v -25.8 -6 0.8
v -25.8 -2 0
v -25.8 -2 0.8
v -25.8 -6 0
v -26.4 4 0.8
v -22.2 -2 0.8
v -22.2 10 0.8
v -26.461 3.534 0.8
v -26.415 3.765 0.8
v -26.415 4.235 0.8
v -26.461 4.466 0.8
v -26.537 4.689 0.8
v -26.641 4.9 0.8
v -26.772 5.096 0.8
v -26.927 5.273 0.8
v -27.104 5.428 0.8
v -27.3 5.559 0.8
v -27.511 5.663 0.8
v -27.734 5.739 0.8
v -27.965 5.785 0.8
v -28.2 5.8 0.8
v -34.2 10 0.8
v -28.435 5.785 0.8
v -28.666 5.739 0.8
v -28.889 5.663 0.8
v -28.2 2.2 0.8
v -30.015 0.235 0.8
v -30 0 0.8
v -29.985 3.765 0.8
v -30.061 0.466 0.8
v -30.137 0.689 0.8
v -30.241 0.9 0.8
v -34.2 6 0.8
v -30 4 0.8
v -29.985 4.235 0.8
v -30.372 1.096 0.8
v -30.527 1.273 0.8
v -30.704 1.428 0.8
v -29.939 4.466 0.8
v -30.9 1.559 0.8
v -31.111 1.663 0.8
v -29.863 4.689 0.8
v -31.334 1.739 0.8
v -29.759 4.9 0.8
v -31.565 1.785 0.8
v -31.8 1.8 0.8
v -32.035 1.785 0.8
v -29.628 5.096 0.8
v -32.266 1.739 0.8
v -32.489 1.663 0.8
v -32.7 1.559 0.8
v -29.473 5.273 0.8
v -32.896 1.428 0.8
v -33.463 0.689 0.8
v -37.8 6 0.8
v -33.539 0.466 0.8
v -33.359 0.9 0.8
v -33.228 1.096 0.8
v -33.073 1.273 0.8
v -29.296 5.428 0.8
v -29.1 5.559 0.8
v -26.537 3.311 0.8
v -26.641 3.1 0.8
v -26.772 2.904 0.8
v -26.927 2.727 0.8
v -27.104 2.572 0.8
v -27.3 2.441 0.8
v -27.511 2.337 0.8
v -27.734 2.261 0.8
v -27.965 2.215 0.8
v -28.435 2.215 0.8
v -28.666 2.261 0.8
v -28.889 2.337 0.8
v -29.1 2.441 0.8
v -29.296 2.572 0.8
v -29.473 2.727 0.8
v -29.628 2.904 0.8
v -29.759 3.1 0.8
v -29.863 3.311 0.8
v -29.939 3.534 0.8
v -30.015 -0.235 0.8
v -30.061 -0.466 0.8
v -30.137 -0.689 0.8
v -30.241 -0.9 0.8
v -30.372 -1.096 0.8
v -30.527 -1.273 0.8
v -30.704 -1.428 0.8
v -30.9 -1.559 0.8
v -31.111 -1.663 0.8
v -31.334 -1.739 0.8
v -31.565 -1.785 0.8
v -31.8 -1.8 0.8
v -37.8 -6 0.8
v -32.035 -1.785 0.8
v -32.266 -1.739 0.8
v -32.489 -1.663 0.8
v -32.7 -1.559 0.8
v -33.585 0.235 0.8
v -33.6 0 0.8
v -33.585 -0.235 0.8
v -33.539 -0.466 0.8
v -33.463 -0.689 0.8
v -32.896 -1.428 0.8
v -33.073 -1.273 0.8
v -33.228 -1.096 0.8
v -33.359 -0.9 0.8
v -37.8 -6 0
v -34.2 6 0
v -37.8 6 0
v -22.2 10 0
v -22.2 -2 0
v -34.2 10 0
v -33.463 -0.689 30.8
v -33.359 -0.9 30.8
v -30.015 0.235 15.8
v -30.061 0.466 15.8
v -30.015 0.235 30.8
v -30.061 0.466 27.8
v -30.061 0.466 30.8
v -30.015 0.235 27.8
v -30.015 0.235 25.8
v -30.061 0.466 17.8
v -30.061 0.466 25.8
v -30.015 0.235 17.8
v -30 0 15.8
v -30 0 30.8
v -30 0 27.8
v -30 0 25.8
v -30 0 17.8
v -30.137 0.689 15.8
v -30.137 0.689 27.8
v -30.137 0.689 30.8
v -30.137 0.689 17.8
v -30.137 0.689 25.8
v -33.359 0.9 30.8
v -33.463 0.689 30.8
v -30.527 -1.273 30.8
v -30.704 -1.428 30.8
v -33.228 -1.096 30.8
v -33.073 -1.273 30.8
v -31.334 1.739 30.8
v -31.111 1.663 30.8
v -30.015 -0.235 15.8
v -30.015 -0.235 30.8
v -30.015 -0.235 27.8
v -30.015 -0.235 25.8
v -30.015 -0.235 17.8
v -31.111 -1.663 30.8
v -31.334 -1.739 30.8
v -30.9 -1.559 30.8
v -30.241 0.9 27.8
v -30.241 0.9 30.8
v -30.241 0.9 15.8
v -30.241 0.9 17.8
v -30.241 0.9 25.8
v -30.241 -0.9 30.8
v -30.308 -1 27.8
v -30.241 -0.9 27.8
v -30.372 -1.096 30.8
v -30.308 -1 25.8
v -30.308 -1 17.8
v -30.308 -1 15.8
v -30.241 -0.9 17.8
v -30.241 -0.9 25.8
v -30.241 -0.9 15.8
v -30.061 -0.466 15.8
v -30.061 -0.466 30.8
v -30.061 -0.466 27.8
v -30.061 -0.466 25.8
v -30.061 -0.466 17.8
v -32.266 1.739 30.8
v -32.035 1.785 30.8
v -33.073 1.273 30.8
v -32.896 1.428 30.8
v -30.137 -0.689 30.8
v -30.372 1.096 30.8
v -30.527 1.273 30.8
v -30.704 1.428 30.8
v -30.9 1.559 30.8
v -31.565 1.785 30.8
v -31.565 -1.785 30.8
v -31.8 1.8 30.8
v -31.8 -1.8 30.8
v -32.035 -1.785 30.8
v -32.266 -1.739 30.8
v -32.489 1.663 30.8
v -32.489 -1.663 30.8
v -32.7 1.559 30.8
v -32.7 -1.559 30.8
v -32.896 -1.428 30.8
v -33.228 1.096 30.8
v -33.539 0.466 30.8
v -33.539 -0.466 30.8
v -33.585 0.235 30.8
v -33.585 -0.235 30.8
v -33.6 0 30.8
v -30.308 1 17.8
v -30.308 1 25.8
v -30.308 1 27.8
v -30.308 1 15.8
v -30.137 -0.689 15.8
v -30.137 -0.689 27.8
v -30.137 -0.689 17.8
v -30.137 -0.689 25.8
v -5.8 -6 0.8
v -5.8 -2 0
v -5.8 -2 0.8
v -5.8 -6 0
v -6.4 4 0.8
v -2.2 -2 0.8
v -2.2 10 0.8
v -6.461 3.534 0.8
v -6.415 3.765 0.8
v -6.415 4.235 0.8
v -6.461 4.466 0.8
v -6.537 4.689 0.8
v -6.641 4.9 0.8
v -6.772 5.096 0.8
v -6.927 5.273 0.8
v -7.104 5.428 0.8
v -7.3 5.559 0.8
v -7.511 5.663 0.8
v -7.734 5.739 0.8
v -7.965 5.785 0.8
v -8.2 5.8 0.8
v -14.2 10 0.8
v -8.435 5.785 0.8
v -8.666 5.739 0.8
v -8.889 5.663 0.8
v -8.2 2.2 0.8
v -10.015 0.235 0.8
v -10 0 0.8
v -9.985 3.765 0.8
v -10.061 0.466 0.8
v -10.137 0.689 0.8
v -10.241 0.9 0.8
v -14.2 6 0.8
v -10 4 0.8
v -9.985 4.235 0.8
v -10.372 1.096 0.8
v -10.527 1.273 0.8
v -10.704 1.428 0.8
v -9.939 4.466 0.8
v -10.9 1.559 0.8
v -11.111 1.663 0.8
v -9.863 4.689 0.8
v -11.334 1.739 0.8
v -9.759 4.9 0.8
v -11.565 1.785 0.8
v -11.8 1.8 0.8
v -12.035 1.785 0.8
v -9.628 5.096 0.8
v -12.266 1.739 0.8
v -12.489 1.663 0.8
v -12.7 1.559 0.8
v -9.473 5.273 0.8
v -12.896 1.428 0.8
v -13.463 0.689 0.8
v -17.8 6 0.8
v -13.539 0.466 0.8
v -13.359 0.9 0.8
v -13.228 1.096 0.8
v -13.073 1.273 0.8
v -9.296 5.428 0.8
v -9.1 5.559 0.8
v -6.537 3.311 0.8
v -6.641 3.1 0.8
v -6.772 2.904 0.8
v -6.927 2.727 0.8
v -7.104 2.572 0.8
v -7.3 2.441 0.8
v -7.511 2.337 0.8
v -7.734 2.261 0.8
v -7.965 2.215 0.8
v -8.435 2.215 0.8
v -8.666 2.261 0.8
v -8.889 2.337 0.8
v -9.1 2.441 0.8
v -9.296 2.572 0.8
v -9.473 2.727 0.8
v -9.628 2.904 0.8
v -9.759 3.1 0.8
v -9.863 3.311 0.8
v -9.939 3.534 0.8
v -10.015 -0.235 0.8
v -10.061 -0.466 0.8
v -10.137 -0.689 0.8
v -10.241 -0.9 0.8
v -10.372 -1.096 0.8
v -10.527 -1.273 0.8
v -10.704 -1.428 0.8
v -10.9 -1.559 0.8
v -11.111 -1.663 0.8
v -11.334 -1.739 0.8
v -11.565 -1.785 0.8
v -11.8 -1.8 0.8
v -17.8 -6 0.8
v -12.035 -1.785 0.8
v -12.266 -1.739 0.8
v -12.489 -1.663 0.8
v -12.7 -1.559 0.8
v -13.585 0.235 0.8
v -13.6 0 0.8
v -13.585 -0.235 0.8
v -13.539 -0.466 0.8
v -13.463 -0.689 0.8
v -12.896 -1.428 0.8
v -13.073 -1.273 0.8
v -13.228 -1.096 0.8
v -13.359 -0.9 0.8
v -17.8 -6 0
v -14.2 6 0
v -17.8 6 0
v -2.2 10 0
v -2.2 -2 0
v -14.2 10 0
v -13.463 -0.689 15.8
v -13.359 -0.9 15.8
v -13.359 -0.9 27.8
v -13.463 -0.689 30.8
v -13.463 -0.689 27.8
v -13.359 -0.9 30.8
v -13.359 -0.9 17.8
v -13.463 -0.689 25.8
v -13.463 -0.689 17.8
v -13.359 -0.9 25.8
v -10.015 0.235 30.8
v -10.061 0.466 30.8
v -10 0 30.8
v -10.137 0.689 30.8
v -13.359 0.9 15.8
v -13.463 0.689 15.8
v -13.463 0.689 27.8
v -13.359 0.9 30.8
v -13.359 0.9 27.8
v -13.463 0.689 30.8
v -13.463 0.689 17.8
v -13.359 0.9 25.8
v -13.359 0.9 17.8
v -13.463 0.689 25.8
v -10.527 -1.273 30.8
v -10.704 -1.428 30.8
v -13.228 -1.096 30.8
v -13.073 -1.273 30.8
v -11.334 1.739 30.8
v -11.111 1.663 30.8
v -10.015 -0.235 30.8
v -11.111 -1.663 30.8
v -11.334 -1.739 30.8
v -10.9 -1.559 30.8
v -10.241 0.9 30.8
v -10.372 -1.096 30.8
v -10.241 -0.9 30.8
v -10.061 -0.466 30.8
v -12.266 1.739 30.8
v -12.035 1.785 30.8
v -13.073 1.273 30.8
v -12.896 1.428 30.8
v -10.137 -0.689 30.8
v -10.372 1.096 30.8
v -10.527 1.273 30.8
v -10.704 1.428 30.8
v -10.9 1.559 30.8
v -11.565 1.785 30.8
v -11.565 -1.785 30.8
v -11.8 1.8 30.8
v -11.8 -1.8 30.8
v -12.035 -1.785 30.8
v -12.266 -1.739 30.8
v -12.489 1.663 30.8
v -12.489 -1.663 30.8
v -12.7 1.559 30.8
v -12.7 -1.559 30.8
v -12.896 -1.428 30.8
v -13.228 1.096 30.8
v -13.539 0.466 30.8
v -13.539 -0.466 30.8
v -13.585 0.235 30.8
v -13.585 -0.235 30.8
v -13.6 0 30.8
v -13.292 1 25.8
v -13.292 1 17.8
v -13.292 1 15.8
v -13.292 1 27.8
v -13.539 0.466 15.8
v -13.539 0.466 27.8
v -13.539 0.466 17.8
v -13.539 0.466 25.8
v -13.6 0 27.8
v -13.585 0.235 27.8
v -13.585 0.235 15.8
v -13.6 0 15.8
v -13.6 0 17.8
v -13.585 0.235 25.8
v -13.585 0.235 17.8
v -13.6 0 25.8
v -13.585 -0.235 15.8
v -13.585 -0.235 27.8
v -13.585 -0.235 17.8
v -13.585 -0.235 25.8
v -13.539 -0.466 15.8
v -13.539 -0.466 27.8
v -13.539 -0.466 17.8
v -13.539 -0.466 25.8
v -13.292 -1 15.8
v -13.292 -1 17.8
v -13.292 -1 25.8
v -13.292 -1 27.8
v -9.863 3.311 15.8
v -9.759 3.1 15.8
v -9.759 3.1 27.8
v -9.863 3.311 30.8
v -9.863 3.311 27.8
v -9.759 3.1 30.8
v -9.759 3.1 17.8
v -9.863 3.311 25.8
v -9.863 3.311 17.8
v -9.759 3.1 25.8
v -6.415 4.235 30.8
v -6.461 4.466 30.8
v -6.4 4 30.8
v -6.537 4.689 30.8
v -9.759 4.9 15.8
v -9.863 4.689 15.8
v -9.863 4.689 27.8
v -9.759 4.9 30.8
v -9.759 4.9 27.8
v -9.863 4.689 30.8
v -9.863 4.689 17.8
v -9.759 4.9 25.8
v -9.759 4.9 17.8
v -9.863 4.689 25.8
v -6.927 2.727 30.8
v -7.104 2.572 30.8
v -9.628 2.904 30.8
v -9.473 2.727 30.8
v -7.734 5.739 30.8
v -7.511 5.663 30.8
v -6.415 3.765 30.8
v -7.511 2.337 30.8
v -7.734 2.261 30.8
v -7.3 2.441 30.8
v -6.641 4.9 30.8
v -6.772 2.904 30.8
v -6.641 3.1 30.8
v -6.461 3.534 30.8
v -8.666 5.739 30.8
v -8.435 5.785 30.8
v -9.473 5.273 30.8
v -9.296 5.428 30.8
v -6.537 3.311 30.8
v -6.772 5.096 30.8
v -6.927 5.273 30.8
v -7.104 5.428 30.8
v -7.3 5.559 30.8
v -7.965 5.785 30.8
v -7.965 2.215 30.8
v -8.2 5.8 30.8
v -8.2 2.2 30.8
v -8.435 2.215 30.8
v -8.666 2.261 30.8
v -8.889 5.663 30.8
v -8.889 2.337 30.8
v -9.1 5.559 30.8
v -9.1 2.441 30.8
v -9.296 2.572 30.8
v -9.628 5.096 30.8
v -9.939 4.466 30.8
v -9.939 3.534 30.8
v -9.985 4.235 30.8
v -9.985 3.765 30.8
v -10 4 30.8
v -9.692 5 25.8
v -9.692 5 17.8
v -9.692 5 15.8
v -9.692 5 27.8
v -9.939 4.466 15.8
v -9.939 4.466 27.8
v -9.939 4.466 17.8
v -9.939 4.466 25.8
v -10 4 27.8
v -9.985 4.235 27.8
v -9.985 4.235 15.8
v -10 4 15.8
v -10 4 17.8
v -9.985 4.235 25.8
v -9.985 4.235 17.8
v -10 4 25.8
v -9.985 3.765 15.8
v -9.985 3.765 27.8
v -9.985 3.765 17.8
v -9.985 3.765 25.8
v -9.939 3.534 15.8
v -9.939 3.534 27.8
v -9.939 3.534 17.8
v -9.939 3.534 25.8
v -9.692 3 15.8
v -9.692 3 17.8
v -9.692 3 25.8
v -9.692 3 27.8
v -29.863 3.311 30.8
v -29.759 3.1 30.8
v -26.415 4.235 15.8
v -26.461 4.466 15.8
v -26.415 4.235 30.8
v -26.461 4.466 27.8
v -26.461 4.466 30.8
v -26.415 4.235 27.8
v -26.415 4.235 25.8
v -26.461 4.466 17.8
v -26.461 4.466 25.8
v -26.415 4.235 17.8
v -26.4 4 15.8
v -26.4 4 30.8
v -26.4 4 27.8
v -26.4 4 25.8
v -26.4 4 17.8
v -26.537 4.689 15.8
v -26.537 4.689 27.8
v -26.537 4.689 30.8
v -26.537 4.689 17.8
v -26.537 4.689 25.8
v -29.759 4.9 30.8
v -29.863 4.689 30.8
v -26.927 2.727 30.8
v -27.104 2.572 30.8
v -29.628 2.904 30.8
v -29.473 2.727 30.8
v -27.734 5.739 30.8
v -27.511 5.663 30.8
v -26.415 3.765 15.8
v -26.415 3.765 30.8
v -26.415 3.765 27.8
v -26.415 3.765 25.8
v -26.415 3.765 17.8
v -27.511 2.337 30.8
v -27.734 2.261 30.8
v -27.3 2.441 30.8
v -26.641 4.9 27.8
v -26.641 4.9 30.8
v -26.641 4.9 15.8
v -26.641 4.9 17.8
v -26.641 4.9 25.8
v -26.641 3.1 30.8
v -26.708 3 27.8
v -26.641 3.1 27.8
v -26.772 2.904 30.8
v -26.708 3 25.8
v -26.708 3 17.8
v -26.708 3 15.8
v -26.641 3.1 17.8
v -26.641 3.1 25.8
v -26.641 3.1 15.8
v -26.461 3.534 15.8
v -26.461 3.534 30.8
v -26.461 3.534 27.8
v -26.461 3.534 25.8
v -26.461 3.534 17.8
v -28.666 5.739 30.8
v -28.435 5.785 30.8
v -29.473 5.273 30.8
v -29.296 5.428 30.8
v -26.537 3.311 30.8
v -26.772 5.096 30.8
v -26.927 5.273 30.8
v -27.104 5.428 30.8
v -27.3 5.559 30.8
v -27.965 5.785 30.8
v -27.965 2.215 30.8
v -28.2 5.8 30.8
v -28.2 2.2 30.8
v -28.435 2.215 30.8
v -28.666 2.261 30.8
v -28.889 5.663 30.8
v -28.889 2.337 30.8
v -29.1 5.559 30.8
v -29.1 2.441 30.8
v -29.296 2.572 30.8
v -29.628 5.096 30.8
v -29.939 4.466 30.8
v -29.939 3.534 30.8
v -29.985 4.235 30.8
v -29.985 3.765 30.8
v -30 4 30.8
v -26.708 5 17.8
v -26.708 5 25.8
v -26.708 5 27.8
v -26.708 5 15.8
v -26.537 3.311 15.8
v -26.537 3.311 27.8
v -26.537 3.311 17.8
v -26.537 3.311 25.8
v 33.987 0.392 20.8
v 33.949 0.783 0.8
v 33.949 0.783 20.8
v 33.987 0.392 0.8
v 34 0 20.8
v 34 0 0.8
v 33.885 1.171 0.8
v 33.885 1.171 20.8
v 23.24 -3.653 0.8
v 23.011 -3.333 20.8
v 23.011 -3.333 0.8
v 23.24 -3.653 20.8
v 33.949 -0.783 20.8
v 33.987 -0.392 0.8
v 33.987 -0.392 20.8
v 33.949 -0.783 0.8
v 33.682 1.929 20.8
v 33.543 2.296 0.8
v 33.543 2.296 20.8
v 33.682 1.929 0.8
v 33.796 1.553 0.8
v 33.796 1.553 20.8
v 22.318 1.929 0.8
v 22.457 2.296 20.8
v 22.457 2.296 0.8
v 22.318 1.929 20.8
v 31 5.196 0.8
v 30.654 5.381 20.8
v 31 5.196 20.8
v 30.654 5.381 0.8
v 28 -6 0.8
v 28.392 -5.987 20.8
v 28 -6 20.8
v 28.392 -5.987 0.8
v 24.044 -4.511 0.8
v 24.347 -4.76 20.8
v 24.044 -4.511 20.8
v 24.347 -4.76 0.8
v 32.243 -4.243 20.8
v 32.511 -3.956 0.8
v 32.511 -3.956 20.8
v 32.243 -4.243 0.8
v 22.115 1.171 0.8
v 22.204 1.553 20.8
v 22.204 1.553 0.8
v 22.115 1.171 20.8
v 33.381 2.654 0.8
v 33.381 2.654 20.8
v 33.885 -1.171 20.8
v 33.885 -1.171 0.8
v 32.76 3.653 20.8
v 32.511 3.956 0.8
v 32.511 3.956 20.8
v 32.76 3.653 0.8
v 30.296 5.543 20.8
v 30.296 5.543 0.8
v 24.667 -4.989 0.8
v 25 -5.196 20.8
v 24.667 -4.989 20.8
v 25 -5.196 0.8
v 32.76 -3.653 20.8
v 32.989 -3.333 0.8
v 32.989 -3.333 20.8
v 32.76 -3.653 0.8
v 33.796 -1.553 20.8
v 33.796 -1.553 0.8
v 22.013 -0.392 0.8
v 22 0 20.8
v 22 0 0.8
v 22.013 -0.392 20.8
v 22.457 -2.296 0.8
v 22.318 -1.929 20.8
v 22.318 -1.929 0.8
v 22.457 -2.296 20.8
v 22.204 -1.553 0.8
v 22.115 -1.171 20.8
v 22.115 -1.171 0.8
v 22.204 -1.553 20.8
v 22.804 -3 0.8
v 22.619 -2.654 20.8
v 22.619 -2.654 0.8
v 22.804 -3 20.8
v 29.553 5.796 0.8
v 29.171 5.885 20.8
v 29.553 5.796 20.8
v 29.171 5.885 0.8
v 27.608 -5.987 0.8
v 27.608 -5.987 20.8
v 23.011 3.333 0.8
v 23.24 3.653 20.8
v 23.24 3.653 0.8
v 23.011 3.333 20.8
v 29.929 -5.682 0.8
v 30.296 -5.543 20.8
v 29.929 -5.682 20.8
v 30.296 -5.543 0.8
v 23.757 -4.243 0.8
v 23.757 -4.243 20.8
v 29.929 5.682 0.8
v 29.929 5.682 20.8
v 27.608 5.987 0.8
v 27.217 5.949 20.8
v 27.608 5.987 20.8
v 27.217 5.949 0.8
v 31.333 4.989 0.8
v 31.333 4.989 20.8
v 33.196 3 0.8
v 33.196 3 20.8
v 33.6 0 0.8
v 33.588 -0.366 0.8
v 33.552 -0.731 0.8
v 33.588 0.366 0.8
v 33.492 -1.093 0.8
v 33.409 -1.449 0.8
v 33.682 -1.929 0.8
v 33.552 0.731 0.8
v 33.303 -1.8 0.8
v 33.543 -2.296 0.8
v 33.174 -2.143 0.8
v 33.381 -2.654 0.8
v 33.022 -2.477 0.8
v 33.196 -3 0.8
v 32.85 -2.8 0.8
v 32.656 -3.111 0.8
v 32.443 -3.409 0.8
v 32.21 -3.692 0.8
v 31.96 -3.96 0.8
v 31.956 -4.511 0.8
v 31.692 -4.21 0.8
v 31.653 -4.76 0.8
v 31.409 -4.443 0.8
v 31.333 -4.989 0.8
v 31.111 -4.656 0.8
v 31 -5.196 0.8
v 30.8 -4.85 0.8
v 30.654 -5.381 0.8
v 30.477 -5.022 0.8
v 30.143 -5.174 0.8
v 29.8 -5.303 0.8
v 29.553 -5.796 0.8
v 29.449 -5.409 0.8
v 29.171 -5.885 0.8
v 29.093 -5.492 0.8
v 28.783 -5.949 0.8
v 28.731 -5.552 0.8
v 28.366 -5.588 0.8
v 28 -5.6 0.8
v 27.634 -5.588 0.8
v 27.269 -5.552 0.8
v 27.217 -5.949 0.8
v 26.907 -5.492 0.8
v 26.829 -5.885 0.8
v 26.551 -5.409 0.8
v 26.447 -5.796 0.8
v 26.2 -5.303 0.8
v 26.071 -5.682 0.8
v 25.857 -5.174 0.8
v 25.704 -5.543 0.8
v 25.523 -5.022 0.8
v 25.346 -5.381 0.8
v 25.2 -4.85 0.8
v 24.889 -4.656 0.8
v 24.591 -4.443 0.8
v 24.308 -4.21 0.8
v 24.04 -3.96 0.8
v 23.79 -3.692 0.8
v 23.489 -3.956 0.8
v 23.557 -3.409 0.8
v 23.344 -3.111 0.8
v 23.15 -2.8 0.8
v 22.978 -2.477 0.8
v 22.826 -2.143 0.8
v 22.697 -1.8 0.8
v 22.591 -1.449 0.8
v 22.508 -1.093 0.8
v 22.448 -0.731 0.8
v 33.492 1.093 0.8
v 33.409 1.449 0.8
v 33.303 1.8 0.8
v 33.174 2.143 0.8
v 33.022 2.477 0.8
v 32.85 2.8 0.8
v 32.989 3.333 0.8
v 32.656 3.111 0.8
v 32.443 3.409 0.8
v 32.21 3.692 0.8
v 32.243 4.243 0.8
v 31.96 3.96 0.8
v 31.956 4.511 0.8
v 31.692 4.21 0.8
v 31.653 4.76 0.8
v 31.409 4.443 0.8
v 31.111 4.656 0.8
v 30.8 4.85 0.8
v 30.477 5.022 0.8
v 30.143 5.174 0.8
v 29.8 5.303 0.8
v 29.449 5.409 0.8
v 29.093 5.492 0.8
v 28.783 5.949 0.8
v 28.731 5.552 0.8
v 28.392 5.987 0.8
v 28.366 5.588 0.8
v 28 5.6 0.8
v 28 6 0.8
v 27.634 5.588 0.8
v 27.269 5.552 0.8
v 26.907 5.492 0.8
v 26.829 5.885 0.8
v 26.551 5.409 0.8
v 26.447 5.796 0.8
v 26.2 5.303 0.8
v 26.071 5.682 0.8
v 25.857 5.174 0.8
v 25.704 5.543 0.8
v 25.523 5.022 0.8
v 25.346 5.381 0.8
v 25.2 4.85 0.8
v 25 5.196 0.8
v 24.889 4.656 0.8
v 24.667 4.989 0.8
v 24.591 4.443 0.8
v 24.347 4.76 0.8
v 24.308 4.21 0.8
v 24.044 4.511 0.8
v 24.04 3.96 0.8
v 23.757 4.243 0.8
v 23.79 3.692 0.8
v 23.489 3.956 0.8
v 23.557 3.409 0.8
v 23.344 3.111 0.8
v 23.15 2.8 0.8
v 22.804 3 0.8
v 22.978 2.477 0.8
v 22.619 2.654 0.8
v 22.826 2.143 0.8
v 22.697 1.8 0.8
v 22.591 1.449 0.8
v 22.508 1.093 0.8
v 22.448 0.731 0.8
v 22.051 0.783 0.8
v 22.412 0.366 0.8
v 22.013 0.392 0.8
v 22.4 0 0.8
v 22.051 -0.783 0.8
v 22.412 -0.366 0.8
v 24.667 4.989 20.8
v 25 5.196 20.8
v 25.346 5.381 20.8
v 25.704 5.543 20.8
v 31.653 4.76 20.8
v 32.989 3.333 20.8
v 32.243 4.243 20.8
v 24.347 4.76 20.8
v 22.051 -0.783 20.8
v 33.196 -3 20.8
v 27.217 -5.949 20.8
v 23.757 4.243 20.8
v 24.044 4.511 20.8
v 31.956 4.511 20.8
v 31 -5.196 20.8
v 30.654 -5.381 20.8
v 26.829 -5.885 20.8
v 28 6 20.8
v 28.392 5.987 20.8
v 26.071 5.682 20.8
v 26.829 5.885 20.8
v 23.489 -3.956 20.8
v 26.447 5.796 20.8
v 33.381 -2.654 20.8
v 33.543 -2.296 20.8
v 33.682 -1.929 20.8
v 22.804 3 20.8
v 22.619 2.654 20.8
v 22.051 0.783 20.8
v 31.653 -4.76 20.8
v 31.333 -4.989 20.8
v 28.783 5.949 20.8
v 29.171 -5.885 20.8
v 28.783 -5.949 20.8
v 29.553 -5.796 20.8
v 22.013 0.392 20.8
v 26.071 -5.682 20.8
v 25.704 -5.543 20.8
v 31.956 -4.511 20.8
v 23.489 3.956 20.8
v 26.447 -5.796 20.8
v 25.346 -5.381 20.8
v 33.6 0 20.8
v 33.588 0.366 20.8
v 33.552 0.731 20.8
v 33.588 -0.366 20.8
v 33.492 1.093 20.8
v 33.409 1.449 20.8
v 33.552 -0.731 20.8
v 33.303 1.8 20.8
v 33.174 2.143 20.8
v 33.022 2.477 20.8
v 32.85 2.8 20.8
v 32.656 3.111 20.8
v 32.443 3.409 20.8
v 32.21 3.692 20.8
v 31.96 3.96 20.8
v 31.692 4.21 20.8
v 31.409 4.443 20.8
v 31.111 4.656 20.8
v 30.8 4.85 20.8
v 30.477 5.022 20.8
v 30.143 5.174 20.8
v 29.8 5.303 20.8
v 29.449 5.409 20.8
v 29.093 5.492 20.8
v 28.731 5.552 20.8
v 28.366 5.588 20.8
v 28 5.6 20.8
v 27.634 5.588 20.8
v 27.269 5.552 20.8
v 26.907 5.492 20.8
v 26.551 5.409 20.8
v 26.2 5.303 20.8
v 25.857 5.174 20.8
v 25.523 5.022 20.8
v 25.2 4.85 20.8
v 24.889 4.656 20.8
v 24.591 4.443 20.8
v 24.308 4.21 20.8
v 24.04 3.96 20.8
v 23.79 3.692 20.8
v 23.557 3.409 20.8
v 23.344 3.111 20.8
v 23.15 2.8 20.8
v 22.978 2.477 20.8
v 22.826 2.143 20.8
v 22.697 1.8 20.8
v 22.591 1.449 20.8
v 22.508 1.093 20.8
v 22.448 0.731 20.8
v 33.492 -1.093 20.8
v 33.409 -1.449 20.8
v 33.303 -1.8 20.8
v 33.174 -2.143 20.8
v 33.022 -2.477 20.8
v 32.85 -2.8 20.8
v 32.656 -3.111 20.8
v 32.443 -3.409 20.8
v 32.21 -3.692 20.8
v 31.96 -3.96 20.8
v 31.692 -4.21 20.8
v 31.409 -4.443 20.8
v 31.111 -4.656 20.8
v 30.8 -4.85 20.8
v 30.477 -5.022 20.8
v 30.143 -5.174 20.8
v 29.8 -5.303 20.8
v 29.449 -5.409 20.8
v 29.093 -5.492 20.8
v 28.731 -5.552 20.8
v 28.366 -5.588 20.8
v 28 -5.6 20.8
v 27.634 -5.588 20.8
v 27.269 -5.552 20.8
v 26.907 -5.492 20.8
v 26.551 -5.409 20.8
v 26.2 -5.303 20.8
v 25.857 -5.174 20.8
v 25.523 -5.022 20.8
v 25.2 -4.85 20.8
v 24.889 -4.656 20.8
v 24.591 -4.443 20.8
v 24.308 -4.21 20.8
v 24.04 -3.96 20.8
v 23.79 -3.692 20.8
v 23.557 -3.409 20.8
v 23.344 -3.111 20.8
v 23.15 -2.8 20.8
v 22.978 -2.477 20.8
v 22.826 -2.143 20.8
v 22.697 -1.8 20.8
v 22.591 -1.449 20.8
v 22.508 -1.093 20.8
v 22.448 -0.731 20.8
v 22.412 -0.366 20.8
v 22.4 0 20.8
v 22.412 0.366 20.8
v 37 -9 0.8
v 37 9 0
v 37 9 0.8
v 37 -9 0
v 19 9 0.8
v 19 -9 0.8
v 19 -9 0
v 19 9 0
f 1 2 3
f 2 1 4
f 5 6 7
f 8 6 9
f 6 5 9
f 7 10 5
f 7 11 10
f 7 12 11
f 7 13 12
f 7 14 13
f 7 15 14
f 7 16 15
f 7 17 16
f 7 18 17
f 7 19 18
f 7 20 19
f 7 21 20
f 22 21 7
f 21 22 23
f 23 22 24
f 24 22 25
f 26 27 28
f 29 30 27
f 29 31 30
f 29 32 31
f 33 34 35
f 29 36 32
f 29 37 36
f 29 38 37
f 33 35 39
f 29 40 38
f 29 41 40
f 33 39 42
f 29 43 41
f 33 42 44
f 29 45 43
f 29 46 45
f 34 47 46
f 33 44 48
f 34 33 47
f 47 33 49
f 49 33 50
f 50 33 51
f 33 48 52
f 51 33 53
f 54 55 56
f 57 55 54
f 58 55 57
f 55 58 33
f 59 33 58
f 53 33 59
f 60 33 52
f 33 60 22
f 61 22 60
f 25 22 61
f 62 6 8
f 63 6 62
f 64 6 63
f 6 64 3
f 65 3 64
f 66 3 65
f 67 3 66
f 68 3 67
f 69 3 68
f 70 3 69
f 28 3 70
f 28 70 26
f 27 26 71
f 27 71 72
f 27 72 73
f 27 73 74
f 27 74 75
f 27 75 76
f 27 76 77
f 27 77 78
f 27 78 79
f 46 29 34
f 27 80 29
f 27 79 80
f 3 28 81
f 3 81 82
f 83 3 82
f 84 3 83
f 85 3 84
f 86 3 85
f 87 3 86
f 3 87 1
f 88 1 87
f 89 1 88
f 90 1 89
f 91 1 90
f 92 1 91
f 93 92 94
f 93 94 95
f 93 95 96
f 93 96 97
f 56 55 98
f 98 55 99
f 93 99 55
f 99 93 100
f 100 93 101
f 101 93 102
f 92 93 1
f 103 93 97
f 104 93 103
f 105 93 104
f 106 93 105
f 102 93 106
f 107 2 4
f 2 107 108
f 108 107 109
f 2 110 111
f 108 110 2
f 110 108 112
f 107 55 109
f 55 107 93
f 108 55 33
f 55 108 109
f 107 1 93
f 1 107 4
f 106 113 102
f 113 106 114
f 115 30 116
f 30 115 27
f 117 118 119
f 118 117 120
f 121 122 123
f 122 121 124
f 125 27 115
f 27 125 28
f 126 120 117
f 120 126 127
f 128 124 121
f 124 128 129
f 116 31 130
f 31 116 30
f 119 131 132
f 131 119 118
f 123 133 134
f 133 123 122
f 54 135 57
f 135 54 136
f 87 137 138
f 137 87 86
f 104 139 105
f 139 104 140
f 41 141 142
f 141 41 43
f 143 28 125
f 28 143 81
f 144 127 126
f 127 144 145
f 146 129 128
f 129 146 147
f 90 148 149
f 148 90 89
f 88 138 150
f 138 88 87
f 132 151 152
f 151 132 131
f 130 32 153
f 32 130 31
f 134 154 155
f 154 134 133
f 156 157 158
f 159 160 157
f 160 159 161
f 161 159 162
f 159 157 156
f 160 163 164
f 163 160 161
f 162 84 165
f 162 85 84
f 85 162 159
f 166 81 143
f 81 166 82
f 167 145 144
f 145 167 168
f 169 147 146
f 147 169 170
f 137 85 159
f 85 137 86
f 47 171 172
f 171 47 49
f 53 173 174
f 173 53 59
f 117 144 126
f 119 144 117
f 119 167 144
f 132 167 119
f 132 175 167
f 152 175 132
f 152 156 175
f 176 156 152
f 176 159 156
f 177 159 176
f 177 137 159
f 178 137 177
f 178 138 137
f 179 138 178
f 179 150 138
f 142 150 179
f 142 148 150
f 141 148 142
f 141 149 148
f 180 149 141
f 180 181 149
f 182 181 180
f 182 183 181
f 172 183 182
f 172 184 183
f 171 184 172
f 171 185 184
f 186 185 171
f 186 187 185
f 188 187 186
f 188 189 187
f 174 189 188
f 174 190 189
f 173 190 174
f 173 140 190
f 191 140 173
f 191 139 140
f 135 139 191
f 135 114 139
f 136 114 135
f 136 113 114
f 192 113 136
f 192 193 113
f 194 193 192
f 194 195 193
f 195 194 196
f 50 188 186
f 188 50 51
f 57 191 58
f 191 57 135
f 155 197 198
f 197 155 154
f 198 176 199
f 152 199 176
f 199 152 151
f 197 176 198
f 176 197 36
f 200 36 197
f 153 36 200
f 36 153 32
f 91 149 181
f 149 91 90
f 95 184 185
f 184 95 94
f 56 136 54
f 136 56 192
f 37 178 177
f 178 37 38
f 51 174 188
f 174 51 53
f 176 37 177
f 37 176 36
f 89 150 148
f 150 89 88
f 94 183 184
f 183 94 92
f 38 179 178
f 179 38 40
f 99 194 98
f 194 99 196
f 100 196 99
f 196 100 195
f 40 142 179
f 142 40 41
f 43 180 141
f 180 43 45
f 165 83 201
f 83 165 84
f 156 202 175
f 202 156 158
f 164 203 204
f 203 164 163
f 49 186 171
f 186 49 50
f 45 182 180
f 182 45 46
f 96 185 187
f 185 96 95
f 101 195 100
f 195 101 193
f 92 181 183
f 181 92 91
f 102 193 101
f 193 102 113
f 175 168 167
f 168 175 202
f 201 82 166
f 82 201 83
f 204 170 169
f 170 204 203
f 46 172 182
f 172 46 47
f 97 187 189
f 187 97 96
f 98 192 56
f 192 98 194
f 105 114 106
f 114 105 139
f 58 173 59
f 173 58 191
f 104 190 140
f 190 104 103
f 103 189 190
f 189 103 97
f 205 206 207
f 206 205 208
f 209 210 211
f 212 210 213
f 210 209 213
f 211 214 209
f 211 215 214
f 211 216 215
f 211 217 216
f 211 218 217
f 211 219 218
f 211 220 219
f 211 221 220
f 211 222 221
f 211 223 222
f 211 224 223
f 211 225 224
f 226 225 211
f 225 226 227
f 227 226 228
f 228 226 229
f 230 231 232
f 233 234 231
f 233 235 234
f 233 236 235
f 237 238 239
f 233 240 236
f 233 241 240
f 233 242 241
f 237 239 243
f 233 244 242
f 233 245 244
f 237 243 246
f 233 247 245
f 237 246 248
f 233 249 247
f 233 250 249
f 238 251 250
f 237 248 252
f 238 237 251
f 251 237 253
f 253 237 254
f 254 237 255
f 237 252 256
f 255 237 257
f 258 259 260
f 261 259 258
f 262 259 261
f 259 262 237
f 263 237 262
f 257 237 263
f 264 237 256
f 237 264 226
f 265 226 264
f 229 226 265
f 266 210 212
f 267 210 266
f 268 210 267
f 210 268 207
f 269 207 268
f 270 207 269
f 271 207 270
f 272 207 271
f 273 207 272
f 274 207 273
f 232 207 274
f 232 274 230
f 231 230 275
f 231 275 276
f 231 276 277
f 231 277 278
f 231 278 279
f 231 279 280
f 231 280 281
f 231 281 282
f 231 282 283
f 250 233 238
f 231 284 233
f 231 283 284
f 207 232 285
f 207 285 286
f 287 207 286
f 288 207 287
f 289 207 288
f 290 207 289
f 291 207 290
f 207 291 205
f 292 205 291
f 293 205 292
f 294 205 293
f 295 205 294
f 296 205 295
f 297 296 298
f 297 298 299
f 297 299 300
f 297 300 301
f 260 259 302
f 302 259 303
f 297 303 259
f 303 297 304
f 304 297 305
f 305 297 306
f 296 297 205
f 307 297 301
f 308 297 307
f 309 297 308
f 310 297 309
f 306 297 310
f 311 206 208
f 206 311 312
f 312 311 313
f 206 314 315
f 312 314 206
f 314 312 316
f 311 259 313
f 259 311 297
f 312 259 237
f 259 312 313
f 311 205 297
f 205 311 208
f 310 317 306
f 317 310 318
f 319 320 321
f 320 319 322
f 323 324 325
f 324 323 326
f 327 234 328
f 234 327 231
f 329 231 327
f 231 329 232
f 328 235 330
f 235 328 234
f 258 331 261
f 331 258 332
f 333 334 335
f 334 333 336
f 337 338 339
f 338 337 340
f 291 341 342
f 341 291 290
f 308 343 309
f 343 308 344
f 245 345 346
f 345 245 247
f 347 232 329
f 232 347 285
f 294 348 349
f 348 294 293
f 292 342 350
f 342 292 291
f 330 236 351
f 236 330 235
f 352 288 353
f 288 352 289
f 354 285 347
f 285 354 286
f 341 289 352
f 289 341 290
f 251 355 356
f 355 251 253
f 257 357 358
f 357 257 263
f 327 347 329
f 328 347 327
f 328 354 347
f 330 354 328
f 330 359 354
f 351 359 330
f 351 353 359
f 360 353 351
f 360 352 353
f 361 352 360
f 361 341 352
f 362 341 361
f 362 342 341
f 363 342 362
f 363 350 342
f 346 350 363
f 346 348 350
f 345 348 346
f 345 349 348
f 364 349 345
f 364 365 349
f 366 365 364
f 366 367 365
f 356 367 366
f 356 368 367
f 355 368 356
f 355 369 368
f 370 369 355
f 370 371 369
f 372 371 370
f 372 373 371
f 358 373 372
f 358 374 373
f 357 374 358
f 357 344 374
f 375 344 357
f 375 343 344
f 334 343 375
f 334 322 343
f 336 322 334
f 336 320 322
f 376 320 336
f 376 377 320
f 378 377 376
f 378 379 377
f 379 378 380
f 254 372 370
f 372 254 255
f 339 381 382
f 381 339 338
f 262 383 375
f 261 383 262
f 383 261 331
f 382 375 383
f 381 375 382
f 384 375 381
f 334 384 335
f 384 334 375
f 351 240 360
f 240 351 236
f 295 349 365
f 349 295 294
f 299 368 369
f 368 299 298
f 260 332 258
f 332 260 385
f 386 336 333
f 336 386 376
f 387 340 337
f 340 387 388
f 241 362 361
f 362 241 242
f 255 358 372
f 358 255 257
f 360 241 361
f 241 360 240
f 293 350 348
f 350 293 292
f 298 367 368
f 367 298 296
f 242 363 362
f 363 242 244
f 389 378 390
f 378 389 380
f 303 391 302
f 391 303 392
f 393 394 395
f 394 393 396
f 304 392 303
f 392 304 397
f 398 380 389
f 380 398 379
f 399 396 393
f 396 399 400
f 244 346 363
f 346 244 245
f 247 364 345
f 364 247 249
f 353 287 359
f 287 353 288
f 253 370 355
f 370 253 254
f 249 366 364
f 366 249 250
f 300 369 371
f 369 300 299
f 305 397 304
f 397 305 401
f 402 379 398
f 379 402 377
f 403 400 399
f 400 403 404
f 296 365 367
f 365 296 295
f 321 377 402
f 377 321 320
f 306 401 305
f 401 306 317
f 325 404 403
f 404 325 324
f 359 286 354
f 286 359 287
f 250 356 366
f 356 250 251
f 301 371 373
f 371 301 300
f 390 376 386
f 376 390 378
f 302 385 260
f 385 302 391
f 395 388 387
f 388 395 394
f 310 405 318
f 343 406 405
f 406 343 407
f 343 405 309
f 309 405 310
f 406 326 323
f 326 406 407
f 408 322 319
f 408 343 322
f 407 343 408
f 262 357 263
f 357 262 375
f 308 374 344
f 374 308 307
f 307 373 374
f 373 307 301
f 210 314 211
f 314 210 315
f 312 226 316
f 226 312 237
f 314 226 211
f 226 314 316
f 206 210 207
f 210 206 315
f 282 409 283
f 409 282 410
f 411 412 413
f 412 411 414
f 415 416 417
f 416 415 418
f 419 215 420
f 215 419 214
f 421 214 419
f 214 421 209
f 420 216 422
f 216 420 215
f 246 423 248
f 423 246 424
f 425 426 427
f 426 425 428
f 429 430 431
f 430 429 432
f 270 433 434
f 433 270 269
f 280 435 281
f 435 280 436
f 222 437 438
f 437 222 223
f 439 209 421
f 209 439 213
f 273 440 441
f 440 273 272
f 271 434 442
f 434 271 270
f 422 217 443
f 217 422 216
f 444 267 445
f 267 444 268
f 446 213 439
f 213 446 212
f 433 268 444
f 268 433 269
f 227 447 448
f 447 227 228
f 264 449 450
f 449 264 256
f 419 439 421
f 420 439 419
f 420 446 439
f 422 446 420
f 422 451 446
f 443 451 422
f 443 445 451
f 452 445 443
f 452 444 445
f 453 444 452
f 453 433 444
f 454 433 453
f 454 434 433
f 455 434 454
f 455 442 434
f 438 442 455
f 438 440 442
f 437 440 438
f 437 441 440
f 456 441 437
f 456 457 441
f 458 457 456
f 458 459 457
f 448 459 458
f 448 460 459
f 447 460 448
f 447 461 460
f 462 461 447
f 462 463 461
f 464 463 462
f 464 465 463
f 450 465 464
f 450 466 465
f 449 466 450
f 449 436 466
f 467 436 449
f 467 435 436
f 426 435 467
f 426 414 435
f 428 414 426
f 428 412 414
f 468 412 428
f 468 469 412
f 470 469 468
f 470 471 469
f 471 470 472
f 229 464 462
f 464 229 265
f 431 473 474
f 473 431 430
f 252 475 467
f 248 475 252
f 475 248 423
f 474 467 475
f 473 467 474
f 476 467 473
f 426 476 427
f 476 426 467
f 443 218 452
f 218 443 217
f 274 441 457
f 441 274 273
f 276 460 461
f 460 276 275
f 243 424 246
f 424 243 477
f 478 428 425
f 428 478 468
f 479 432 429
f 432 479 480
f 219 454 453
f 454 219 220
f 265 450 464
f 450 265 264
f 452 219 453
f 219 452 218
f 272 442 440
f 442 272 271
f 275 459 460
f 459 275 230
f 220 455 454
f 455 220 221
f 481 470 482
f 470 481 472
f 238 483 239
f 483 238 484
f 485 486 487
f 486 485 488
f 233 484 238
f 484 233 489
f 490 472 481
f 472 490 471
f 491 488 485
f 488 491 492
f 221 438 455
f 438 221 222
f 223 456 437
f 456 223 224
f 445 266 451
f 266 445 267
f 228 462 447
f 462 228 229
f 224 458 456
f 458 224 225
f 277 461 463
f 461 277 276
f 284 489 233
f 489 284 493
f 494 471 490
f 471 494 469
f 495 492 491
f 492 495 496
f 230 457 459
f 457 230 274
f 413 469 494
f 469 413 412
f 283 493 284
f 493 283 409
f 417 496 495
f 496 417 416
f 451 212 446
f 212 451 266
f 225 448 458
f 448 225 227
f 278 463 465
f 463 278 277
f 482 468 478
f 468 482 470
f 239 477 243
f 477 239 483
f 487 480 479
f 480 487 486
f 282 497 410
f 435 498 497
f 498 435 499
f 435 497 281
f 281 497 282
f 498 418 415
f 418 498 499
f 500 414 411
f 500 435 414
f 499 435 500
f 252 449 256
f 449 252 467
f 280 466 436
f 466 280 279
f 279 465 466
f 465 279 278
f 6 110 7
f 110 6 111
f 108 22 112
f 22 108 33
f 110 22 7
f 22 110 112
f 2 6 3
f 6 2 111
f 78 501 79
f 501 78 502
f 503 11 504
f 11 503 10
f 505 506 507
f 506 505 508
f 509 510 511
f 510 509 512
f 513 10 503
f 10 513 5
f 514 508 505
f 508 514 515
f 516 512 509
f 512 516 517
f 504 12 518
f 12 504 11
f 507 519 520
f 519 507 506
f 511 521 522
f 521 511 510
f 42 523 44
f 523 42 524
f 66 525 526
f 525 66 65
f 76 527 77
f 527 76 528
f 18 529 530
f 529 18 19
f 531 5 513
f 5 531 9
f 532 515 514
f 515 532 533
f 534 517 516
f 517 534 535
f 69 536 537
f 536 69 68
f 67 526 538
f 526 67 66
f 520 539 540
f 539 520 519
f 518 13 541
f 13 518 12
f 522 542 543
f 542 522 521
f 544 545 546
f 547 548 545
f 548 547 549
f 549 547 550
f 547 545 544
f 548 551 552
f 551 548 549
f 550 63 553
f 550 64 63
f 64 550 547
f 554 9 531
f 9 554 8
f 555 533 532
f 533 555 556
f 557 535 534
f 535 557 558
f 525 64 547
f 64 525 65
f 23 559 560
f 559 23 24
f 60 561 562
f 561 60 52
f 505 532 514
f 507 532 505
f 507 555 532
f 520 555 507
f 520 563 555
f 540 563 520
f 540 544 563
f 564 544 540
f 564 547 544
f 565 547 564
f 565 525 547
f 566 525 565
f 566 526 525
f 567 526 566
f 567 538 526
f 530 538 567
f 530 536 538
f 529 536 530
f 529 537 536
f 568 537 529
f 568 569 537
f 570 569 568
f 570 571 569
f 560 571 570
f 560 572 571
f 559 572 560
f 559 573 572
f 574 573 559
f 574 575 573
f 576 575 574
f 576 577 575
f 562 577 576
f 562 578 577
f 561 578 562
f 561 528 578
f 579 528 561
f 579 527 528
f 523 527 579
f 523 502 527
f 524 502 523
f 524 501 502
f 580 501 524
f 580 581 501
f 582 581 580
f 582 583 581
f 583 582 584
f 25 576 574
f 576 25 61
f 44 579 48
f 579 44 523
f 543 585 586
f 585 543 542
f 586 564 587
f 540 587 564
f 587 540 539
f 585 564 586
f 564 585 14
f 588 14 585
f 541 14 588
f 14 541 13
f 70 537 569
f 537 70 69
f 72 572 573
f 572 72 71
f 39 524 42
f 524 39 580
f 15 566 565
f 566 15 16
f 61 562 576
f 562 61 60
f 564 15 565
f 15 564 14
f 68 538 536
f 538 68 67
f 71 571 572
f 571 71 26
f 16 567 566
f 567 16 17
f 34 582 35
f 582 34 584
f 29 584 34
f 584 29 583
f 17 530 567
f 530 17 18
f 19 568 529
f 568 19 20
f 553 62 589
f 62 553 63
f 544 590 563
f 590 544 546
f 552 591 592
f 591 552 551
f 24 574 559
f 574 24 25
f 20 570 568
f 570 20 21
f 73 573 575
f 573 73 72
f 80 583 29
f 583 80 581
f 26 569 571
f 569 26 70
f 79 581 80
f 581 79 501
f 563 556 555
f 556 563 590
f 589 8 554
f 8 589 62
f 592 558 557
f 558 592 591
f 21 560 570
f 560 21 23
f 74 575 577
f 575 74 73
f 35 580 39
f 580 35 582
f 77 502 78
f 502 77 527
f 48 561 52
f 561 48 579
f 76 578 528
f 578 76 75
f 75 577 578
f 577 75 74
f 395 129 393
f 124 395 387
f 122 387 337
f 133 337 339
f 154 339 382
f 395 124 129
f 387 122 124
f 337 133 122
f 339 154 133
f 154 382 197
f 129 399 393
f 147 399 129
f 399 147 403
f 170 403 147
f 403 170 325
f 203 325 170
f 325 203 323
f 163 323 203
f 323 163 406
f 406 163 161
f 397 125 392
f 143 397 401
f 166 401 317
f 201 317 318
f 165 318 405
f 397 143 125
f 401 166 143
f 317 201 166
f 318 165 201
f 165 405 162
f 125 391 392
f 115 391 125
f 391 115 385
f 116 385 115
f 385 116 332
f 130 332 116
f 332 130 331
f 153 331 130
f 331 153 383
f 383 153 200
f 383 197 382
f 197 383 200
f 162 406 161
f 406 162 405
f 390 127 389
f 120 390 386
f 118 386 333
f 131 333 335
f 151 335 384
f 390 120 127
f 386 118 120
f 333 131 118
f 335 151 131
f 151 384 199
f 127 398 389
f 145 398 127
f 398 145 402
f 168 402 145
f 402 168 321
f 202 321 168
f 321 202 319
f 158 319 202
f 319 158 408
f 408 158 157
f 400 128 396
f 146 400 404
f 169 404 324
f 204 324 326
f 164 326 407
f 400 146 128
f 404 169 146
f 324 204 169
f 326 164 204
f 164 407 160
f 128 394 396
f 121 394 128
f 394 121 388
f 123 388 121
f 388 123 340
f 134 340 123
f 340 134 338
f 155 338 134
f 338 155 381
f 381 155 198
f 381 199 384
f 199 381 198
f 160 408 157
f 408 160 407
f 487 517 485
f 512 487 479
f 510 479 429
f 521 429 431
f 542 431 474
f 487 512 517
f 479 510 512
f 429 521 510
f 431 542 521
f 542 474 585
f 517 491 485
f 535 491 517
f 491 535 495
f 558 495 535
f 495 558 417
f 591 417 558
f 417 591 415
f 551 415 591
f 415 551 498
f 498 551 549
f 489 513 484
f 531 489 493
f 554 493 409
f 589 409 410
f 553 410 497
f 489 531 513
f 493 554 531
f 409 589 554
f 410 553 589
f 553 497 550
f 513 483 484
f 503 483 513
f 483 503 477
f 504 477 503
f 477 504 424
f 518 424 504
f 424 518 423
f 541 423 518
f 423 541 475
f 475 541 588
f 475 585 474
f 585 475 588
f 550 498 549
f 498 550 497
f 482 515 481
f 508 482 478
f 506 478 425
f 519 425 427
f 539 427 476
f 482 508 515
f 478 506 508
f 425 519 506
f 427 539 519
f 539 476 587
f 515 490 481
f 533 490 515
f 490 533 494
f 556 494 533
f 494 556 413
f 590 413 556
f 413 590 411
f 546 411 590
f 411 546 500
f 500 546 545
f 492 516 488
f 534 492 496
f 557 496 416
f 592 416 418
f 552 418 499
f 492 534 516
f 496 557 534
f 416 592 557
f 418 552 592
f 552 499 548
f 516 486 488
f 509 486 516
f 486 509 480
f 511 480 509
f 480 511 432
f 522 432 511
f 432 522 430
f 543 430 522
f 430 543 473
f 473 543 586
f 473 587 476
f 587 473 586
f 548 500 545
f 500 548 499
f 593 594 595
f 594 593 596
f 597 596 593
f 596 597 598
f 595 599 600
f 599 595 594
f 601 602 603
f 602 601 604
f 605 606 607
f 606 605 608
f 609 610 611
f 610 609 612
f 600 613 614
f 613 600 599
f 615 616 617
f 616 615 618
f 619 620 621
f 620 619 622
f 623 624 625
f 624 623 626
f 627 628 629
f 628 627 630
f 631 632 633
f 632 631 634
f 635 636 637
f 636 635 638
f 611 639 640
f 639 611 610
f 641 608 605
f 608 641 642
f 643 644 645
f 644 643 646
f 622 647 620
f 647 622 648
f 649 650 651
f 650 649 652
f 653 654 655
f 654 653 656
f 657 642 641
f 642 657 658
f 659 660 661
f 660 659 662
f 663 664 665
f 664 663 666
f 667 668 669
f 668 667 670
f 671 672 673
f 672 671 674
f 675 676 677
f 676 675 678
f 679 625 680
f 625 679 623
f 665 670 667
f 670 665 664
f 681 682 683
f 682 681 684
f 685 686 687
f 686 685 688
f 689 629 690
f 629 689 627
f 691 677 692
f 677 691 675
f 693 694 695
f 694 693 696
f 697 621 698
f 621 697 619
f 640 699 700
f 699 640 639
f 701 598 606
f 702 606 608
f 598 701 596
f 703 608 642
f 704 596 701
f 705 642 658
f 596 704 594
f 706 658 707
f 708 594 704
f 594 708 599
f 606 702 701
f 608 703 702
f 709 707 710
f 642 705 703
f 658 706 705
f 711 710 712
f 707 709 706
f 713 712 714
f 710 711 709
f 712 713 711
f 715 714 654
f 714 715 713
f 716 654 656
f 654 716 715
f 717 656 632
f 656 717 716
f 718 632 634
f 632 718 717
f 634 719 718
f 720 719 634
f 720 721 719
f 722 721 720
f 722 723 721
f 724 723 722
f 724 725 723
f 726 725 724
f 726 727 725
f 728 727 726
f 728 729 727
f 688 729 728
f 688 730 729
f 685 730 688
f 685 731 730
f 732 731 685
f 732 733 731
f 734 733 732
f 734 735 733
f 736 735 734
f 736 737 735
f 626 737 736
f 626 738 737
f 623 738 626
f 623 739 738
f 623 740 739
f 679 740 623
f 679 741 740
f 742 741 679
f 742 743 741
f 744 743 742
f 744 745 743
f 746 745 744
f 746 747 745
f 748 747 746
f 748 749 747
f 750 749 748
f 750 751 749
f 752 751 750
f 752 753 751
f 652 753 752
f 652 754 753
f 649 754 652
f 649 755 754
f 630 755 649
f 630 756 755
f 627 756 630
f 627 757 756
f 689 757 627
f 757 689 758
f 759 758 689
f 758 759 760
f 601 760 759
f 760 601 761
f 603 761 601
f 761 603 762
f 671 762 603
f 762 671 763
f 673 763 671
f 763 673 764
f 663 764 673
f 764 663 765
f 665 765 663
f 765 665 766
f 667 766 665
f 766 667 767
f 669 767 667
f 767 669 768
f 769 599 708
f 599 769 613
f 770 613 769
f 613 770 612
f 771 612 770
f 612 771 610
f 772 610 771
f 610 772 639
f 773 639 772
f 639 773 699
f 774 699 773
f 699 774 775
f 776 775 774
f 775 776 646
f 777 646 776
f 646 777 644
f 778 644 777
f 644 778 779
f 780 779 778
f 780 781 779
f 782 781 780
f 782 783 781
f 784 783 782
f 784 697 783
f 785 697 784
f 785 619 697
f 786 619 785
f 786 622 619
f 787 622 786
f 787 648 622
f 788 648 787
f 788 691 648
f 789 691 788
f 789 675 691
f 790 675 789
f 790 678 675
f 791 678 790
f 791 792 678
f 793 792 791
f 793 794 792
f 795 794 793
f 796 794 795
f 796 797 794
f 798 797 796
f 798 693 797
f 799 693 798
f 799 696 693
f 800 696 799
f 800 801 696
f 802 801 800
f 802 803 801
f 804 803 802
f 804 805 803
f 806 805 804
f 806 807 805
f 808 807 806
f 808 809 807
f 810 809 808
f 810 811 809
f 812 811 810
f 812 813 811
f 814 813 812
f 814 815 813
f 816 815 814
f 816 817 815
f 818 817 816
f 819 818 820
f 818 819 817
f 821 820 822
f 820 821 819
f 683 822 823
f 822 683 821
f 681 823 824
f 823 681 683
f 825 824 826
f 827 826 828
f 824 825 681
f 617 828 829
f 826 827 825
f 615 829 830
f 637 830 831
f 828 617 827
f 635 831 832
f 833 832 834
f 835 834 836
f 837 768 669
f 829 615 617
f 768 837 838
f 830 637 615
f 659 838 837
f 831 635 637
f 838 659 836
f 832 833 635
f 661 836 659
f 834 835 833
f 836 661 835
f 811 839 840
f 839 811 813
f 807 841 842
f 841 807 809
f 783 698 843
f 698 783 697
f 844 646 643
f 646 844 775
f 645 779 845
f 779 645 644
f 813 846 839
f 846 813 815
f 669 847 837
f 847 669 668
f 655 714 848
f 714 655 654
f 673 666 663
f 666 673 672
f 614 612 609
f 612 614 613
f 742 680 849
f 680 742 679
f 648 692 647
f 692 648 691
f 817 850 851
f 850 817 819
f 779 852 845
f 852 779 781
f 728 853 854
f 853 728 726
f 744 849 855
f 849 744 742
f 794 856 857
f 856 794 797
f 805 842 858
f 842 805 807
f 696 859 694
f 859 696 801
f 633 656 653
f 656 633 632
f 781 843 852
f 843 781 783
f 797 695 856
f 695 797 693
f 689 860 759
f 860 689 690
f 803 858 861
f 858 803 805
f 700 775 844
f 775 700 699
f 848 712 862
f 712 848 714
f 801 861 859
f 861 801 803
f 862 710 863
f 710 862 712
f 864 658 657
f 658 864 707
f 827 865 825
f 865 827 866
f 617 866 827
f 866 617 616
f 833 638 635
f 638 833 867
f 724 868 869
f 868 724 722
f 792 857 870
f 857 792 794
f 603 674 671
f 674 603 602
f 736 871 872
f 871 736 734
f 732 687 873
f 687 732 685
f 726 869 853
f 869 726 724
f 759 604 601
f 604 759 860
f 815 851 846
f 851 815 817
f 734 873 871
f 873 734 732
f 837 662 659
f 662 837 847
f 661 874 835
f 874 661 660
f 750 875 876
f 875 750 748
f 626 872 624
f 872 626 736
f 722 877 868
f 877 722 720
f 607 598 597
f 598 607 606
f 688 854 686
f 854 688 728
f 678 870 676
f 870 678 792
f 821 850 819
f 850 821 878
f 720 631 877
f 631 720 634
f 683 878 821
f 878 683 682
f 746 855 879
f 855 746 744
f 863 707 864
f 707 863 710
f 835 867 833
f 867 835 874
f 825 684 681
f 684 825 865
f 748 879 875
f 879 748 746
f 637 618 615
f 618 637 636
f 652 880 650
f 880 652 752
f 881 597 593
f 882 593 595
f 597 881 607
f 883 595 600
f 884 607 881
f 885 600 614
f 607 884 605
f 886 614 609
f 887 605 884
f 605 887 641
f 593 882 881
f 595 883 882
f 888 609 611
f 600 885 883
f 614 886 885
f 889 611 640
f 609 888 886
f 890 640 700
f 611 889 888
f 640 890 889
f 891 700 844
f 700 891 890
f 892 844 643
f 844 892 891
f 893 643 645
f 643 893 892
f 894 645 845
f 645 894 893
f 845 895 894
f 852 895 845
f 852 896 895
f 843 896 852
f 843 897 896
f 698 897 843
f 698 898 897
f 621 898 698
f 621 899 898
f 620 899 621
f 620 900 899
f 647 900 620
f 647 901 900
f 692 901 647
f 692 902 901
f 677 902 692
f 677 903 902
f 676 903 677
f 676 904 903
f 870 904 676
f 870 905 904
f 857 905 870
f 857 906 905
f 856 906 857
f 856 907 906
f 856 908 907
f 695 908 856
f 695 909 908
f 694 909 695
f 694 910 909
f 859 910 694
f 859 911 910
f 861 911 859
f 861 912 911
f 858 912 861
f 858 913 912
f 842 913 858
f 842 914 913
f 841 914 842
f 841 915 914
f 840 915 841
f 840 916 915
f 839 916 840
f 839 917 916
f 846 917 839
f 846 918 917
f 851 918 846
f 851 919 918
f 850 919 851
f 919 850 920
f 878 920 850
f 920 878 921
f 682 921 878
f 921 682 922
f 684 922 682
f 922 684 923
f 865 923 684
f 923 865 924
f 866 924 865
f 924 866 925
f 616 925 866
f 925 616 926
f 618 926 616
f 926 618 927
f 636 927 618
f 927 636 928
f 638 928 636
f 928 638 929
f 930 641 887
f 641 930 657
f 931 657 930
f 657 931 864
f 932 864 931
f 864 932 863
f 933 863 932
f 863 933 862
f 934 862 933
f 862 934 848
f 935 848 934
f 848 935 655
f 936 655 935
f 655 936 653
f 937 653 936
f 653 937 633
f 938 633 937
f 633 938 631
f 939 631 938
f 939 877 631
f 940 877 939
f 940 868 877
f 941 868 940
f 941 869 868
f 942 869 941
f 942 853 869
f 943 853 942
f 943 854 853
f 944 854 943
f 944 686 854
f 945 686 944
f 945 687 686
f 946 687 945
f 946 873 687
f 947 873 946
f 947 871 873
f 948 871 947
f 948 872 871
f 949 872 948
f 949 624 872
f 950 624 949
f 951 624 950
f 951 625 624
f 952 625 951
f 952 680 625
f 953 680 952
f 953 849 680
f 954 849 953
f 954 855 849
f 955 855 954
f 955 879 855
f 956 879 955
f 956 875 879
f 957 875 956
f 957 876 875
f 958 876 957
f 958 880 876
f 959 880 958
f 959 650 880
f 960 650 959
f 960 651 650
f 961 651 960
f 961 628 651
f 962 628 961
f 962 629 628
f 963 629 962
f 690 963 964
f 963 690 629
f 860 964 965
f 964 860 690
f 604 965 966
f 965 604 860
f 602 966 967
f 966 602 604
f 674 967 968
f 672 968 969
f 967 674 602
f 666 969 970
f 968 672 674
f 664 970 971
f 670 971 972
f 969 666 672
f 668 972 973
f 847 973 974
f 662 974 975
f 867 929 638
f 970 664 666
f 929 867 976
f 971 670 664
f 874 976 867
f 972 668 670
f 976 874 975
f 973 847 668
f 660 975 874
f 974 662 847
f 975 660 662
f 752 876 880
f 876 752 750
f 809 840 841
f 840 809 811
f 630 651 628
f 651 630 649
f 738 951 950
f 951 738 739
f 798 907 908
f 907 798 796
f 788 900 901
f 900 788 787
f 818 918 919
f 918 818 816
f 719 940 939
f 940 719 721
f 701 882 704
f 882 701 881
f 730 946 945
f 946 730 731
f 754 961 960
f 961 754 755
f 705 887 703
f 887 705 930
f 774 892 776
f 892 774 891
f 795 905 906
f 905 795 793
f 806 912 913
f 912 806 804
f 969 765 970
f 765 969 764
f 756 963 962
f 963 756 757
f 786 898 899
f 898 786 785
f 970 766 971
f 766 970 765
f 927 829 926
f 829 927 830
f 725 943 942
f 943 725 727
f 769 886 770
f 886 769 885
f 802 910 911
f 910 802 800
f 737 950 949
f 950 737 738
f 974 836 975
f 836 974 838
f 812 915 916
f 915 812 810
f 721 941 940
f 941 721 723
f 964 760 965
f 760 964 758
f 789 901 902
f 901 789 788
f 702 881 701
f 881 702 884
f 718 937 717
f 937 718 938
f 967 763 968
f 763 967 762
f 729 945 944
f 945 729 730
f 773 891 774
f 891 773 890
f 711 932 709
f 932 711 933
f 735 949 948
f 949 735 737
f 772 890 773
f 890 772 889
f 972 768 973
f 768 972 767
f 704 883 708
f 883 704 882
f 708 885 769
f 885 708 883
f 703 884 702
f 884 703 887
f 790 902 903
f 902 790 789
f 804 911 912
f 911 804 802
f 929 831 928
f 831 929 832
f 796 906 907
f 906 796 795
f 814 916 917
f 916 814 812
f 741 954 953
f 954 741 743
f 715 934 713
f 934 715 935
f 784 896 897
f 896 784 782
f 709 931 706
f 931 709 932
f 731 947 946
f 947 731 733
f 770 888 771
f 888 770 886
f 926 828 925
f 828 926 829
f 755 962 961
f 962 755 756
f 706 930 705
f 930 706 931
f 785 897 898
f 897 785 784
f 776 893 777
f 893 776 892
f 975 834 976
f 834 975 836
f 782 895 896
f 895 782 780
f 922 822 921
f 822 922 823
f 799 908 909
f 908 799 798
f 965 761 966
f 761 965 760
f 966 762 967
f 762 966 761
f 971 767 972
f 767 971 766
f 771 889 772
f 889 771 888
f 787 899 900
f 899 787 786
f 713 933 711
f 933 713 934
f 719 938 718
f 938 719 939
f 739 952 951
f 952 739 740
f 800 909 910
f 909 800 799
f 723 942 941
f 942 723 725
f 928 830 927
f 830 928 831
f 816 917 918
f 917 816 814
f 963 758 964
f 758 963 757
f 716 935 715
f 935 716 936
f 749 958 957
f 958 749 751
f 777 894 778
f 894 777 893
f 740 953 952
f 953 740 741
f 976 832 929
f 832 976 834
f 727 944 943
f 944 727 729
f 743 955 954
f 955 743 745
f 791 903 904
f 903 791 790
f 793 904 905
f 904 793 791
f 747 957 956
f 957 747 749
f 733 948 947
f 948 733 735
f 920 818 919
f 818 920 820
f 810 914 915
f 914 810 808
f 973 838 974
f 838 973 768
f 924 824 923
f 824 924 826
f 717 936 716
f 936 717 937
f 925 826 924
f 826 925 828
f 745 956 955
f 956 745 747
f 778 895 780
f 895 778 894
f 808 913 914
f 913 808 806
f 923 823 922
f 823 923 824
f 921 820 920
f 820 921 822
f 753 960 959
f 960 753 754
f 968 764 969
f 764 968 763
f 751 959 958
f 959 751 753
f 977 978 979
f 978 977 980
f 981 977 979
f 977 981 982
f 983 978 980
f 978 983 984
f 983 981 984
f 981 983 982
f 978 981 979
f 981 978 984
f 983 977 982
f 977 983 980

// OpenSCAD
/*
metricraft — 00-coupons / moisture-check (v1.0.0)
License: Remixes allowed / Non‑Commercial (see /docs/LICENSE)

WHAT
  Ultra‑small coupon to sanity‑check filament moisture in <10 min, <4 g material.
  Two tests: (1) stringing + bridge mast, (2) single‑perimeter thin‑wall tube.

WHY
  Moisture increases melt viscosity variance → stringing, popping, pinholes, poor bridges.
  This coupon gives a fast, visual + audible pass/fail without wasting a big print.

PRINT INSTRUCTIONS (P1S, 0.4 mm nozzle default)
  • Plate: PLA/PETG default profile. Layer height 0.20 mm.
  • Per‑object overrides:
      – thinwall_tube: Walls = 1 loop, Infill = 0%, Top = 0, Bottom = 2.
      – string_bridge_mast: Walls = 2, Infill = 0%, Top = 3, Bottom = 2.
  • Cooling: PLA 100% fan; PETG 30–50% fan.
  • Travel: disable "Avoid crossing walls" for mast (to force retracted travels).
  • Seam: set to REAR and orient the plate arrow so seams land on keep‑out faces.
  • Brim: 2–3 mm brim on thinwall_tube only (improves adhesion, still minimal material).

ACCEPTANCE CRITERIA (PLA reference)
  • Stringing/Bridge Mast: ≤ a few wispy hairs; no bead chains; bridges sag ≤1 mm.
  • Thin‑Wall Tube: smooth wall ~0.42–0.48 mm measured with calipers; no pinholes.
  If fail → dry 2–3 h @ 50–55 °C, cool sealed, reprint. Stop when pass or mass plateau.

OBJECT NAMES (for 3MF):
  01-string-bridge-mast, 02-thinwall-tube, readme-plate (optional)

NOTES
  – Keep geometry small to encourage aggressive travel between posts (provokes stringing if wet).
  – Bridge bars at two heights expose moisture‑related sag and surface bubbling.
  – Thin‑wall uses a single perimeter to reveal bubbles/pockmarks from steam.

PARAMETERS
*/

// ===== User‑tunable =====
nozzle_d = 0.40;           // mm
layer_h  = 0.20;           // mm (for comments; model is geometric)
post_d   = 3.6;            // vertical post diameter
mast_h   = 30;             // mm tower height
post_gap = 20;             // mm clear span between post centers for bridges
base_t   = 0.8;            // mm foot thickness under each post/tube
bridge_w = 2.0;            // mm bridge bar thickness
bridge_z = [15, 25];       // mm bridge heights
label_depth = 0.4;         // mm label emboss height
with_labels = false;       // optional small labels to aid identification

// Plate layout
spacing = 14;              // mm spacing between test groups

// ===== Helpers =====
module _foot_square(x=12,y=12,t=base_t){
  translate([-x/2,-y/2,0]) cube([x,y,t]);
}

module _post(){
  // round post on a small square foot for adhesion
  union(){
    _foot_square();
    translate([0,0,base_t]) cylinder(h=mast_h, d=post_d, $fn=48);
  }
}

module _bridge_bar(len){
  // simple rectangular bridge between posts
  translate([-len/2,-bridge_w/2,0]) cube([len, bridge_w, bridge_w]);
}

module string_bridge_mast(){
  /* Two pairs of posts with bridges at multiple heights to exercise retractions
     and check sag/voids. Intentional gaps provoke travel moves. */
  len = post_gap + post_d; // overall span edge‑to‑edge
  // left pair
  translate([-len/2, 0, 0]) _post();
  translate([-len/2 + post_gap, 0, 0]) _post();
  // right pair, offset forward to prevent accidental merging of toolpaths
  translate([len/2, 4, 0]) _post();
  translate([len/2 - post_gap, 4, 0]) _post();

  // bridges on left pair
  for(z=bridge_z)
    translate([-len/2 + post_gap/2, 0, base_t + z]) _bridge_bar(post_gap);

  // bridges on right pair
  for(z=bridge_z)
    translate([len/2 - post_gap/2, 4, base_t + z]) _bridge_bar(post_gap);

  if(with_labels)
    translate([0,-10,base_t]) linear_extrude(height=label_depth)
      text("string-bridge-mast", size=4, halign="center", valign="center");
}

module thinwall_tube(){
  /* Single‑perimeter tube: OD chosen so slicer emits exactly one loop.
     Wall thickness ~ nozzle_d; shows bubbles/pitting when wet. */
  od = 12; id = od - (nozzle_d*2); // target ~0.4 mm wall
  union(){
    _foot_square(x=18,y=18);
    translate([0,0,base_t]) difference(){
      cylinder(h=20, d=od, $fn=96);
      cylinder(h=20+0.1, d=id, $fn=96);
    }
  }
  if(with_labels)
    translate([0,-12,base_t]) linear_extrude(height=label_depth)
      text("thinwall-tube", size=4, halign="center", valign="center");
}

// ===== Plate assembly =====
module plate_readme(){
  // Tiny 0.6 mm tag to carry README basics; optional
  sz=[52,18,0.6];
  translate([-sz[0]/2,-sz[1]/2,0]) cube(sz);
  translate([0,0,0.6]) linear_extrude(height=0.6)
    text("metricraft moisture check v1.0.0", size=4, halign="center", valign="center");
}

module moisture_check_plate(include_readme=false){
  // Arrange objects compactly within ~80x60 mm
  translate([-20, 0, 0]) string_bridge_mast();
  translate([ 28, 0, 0]) thinwall_tube();
  if(include_readme)
    translate([0, -26, 0]) plate_readme();
}

// === Render ===
moisture_check_plate(include_readme=false);
